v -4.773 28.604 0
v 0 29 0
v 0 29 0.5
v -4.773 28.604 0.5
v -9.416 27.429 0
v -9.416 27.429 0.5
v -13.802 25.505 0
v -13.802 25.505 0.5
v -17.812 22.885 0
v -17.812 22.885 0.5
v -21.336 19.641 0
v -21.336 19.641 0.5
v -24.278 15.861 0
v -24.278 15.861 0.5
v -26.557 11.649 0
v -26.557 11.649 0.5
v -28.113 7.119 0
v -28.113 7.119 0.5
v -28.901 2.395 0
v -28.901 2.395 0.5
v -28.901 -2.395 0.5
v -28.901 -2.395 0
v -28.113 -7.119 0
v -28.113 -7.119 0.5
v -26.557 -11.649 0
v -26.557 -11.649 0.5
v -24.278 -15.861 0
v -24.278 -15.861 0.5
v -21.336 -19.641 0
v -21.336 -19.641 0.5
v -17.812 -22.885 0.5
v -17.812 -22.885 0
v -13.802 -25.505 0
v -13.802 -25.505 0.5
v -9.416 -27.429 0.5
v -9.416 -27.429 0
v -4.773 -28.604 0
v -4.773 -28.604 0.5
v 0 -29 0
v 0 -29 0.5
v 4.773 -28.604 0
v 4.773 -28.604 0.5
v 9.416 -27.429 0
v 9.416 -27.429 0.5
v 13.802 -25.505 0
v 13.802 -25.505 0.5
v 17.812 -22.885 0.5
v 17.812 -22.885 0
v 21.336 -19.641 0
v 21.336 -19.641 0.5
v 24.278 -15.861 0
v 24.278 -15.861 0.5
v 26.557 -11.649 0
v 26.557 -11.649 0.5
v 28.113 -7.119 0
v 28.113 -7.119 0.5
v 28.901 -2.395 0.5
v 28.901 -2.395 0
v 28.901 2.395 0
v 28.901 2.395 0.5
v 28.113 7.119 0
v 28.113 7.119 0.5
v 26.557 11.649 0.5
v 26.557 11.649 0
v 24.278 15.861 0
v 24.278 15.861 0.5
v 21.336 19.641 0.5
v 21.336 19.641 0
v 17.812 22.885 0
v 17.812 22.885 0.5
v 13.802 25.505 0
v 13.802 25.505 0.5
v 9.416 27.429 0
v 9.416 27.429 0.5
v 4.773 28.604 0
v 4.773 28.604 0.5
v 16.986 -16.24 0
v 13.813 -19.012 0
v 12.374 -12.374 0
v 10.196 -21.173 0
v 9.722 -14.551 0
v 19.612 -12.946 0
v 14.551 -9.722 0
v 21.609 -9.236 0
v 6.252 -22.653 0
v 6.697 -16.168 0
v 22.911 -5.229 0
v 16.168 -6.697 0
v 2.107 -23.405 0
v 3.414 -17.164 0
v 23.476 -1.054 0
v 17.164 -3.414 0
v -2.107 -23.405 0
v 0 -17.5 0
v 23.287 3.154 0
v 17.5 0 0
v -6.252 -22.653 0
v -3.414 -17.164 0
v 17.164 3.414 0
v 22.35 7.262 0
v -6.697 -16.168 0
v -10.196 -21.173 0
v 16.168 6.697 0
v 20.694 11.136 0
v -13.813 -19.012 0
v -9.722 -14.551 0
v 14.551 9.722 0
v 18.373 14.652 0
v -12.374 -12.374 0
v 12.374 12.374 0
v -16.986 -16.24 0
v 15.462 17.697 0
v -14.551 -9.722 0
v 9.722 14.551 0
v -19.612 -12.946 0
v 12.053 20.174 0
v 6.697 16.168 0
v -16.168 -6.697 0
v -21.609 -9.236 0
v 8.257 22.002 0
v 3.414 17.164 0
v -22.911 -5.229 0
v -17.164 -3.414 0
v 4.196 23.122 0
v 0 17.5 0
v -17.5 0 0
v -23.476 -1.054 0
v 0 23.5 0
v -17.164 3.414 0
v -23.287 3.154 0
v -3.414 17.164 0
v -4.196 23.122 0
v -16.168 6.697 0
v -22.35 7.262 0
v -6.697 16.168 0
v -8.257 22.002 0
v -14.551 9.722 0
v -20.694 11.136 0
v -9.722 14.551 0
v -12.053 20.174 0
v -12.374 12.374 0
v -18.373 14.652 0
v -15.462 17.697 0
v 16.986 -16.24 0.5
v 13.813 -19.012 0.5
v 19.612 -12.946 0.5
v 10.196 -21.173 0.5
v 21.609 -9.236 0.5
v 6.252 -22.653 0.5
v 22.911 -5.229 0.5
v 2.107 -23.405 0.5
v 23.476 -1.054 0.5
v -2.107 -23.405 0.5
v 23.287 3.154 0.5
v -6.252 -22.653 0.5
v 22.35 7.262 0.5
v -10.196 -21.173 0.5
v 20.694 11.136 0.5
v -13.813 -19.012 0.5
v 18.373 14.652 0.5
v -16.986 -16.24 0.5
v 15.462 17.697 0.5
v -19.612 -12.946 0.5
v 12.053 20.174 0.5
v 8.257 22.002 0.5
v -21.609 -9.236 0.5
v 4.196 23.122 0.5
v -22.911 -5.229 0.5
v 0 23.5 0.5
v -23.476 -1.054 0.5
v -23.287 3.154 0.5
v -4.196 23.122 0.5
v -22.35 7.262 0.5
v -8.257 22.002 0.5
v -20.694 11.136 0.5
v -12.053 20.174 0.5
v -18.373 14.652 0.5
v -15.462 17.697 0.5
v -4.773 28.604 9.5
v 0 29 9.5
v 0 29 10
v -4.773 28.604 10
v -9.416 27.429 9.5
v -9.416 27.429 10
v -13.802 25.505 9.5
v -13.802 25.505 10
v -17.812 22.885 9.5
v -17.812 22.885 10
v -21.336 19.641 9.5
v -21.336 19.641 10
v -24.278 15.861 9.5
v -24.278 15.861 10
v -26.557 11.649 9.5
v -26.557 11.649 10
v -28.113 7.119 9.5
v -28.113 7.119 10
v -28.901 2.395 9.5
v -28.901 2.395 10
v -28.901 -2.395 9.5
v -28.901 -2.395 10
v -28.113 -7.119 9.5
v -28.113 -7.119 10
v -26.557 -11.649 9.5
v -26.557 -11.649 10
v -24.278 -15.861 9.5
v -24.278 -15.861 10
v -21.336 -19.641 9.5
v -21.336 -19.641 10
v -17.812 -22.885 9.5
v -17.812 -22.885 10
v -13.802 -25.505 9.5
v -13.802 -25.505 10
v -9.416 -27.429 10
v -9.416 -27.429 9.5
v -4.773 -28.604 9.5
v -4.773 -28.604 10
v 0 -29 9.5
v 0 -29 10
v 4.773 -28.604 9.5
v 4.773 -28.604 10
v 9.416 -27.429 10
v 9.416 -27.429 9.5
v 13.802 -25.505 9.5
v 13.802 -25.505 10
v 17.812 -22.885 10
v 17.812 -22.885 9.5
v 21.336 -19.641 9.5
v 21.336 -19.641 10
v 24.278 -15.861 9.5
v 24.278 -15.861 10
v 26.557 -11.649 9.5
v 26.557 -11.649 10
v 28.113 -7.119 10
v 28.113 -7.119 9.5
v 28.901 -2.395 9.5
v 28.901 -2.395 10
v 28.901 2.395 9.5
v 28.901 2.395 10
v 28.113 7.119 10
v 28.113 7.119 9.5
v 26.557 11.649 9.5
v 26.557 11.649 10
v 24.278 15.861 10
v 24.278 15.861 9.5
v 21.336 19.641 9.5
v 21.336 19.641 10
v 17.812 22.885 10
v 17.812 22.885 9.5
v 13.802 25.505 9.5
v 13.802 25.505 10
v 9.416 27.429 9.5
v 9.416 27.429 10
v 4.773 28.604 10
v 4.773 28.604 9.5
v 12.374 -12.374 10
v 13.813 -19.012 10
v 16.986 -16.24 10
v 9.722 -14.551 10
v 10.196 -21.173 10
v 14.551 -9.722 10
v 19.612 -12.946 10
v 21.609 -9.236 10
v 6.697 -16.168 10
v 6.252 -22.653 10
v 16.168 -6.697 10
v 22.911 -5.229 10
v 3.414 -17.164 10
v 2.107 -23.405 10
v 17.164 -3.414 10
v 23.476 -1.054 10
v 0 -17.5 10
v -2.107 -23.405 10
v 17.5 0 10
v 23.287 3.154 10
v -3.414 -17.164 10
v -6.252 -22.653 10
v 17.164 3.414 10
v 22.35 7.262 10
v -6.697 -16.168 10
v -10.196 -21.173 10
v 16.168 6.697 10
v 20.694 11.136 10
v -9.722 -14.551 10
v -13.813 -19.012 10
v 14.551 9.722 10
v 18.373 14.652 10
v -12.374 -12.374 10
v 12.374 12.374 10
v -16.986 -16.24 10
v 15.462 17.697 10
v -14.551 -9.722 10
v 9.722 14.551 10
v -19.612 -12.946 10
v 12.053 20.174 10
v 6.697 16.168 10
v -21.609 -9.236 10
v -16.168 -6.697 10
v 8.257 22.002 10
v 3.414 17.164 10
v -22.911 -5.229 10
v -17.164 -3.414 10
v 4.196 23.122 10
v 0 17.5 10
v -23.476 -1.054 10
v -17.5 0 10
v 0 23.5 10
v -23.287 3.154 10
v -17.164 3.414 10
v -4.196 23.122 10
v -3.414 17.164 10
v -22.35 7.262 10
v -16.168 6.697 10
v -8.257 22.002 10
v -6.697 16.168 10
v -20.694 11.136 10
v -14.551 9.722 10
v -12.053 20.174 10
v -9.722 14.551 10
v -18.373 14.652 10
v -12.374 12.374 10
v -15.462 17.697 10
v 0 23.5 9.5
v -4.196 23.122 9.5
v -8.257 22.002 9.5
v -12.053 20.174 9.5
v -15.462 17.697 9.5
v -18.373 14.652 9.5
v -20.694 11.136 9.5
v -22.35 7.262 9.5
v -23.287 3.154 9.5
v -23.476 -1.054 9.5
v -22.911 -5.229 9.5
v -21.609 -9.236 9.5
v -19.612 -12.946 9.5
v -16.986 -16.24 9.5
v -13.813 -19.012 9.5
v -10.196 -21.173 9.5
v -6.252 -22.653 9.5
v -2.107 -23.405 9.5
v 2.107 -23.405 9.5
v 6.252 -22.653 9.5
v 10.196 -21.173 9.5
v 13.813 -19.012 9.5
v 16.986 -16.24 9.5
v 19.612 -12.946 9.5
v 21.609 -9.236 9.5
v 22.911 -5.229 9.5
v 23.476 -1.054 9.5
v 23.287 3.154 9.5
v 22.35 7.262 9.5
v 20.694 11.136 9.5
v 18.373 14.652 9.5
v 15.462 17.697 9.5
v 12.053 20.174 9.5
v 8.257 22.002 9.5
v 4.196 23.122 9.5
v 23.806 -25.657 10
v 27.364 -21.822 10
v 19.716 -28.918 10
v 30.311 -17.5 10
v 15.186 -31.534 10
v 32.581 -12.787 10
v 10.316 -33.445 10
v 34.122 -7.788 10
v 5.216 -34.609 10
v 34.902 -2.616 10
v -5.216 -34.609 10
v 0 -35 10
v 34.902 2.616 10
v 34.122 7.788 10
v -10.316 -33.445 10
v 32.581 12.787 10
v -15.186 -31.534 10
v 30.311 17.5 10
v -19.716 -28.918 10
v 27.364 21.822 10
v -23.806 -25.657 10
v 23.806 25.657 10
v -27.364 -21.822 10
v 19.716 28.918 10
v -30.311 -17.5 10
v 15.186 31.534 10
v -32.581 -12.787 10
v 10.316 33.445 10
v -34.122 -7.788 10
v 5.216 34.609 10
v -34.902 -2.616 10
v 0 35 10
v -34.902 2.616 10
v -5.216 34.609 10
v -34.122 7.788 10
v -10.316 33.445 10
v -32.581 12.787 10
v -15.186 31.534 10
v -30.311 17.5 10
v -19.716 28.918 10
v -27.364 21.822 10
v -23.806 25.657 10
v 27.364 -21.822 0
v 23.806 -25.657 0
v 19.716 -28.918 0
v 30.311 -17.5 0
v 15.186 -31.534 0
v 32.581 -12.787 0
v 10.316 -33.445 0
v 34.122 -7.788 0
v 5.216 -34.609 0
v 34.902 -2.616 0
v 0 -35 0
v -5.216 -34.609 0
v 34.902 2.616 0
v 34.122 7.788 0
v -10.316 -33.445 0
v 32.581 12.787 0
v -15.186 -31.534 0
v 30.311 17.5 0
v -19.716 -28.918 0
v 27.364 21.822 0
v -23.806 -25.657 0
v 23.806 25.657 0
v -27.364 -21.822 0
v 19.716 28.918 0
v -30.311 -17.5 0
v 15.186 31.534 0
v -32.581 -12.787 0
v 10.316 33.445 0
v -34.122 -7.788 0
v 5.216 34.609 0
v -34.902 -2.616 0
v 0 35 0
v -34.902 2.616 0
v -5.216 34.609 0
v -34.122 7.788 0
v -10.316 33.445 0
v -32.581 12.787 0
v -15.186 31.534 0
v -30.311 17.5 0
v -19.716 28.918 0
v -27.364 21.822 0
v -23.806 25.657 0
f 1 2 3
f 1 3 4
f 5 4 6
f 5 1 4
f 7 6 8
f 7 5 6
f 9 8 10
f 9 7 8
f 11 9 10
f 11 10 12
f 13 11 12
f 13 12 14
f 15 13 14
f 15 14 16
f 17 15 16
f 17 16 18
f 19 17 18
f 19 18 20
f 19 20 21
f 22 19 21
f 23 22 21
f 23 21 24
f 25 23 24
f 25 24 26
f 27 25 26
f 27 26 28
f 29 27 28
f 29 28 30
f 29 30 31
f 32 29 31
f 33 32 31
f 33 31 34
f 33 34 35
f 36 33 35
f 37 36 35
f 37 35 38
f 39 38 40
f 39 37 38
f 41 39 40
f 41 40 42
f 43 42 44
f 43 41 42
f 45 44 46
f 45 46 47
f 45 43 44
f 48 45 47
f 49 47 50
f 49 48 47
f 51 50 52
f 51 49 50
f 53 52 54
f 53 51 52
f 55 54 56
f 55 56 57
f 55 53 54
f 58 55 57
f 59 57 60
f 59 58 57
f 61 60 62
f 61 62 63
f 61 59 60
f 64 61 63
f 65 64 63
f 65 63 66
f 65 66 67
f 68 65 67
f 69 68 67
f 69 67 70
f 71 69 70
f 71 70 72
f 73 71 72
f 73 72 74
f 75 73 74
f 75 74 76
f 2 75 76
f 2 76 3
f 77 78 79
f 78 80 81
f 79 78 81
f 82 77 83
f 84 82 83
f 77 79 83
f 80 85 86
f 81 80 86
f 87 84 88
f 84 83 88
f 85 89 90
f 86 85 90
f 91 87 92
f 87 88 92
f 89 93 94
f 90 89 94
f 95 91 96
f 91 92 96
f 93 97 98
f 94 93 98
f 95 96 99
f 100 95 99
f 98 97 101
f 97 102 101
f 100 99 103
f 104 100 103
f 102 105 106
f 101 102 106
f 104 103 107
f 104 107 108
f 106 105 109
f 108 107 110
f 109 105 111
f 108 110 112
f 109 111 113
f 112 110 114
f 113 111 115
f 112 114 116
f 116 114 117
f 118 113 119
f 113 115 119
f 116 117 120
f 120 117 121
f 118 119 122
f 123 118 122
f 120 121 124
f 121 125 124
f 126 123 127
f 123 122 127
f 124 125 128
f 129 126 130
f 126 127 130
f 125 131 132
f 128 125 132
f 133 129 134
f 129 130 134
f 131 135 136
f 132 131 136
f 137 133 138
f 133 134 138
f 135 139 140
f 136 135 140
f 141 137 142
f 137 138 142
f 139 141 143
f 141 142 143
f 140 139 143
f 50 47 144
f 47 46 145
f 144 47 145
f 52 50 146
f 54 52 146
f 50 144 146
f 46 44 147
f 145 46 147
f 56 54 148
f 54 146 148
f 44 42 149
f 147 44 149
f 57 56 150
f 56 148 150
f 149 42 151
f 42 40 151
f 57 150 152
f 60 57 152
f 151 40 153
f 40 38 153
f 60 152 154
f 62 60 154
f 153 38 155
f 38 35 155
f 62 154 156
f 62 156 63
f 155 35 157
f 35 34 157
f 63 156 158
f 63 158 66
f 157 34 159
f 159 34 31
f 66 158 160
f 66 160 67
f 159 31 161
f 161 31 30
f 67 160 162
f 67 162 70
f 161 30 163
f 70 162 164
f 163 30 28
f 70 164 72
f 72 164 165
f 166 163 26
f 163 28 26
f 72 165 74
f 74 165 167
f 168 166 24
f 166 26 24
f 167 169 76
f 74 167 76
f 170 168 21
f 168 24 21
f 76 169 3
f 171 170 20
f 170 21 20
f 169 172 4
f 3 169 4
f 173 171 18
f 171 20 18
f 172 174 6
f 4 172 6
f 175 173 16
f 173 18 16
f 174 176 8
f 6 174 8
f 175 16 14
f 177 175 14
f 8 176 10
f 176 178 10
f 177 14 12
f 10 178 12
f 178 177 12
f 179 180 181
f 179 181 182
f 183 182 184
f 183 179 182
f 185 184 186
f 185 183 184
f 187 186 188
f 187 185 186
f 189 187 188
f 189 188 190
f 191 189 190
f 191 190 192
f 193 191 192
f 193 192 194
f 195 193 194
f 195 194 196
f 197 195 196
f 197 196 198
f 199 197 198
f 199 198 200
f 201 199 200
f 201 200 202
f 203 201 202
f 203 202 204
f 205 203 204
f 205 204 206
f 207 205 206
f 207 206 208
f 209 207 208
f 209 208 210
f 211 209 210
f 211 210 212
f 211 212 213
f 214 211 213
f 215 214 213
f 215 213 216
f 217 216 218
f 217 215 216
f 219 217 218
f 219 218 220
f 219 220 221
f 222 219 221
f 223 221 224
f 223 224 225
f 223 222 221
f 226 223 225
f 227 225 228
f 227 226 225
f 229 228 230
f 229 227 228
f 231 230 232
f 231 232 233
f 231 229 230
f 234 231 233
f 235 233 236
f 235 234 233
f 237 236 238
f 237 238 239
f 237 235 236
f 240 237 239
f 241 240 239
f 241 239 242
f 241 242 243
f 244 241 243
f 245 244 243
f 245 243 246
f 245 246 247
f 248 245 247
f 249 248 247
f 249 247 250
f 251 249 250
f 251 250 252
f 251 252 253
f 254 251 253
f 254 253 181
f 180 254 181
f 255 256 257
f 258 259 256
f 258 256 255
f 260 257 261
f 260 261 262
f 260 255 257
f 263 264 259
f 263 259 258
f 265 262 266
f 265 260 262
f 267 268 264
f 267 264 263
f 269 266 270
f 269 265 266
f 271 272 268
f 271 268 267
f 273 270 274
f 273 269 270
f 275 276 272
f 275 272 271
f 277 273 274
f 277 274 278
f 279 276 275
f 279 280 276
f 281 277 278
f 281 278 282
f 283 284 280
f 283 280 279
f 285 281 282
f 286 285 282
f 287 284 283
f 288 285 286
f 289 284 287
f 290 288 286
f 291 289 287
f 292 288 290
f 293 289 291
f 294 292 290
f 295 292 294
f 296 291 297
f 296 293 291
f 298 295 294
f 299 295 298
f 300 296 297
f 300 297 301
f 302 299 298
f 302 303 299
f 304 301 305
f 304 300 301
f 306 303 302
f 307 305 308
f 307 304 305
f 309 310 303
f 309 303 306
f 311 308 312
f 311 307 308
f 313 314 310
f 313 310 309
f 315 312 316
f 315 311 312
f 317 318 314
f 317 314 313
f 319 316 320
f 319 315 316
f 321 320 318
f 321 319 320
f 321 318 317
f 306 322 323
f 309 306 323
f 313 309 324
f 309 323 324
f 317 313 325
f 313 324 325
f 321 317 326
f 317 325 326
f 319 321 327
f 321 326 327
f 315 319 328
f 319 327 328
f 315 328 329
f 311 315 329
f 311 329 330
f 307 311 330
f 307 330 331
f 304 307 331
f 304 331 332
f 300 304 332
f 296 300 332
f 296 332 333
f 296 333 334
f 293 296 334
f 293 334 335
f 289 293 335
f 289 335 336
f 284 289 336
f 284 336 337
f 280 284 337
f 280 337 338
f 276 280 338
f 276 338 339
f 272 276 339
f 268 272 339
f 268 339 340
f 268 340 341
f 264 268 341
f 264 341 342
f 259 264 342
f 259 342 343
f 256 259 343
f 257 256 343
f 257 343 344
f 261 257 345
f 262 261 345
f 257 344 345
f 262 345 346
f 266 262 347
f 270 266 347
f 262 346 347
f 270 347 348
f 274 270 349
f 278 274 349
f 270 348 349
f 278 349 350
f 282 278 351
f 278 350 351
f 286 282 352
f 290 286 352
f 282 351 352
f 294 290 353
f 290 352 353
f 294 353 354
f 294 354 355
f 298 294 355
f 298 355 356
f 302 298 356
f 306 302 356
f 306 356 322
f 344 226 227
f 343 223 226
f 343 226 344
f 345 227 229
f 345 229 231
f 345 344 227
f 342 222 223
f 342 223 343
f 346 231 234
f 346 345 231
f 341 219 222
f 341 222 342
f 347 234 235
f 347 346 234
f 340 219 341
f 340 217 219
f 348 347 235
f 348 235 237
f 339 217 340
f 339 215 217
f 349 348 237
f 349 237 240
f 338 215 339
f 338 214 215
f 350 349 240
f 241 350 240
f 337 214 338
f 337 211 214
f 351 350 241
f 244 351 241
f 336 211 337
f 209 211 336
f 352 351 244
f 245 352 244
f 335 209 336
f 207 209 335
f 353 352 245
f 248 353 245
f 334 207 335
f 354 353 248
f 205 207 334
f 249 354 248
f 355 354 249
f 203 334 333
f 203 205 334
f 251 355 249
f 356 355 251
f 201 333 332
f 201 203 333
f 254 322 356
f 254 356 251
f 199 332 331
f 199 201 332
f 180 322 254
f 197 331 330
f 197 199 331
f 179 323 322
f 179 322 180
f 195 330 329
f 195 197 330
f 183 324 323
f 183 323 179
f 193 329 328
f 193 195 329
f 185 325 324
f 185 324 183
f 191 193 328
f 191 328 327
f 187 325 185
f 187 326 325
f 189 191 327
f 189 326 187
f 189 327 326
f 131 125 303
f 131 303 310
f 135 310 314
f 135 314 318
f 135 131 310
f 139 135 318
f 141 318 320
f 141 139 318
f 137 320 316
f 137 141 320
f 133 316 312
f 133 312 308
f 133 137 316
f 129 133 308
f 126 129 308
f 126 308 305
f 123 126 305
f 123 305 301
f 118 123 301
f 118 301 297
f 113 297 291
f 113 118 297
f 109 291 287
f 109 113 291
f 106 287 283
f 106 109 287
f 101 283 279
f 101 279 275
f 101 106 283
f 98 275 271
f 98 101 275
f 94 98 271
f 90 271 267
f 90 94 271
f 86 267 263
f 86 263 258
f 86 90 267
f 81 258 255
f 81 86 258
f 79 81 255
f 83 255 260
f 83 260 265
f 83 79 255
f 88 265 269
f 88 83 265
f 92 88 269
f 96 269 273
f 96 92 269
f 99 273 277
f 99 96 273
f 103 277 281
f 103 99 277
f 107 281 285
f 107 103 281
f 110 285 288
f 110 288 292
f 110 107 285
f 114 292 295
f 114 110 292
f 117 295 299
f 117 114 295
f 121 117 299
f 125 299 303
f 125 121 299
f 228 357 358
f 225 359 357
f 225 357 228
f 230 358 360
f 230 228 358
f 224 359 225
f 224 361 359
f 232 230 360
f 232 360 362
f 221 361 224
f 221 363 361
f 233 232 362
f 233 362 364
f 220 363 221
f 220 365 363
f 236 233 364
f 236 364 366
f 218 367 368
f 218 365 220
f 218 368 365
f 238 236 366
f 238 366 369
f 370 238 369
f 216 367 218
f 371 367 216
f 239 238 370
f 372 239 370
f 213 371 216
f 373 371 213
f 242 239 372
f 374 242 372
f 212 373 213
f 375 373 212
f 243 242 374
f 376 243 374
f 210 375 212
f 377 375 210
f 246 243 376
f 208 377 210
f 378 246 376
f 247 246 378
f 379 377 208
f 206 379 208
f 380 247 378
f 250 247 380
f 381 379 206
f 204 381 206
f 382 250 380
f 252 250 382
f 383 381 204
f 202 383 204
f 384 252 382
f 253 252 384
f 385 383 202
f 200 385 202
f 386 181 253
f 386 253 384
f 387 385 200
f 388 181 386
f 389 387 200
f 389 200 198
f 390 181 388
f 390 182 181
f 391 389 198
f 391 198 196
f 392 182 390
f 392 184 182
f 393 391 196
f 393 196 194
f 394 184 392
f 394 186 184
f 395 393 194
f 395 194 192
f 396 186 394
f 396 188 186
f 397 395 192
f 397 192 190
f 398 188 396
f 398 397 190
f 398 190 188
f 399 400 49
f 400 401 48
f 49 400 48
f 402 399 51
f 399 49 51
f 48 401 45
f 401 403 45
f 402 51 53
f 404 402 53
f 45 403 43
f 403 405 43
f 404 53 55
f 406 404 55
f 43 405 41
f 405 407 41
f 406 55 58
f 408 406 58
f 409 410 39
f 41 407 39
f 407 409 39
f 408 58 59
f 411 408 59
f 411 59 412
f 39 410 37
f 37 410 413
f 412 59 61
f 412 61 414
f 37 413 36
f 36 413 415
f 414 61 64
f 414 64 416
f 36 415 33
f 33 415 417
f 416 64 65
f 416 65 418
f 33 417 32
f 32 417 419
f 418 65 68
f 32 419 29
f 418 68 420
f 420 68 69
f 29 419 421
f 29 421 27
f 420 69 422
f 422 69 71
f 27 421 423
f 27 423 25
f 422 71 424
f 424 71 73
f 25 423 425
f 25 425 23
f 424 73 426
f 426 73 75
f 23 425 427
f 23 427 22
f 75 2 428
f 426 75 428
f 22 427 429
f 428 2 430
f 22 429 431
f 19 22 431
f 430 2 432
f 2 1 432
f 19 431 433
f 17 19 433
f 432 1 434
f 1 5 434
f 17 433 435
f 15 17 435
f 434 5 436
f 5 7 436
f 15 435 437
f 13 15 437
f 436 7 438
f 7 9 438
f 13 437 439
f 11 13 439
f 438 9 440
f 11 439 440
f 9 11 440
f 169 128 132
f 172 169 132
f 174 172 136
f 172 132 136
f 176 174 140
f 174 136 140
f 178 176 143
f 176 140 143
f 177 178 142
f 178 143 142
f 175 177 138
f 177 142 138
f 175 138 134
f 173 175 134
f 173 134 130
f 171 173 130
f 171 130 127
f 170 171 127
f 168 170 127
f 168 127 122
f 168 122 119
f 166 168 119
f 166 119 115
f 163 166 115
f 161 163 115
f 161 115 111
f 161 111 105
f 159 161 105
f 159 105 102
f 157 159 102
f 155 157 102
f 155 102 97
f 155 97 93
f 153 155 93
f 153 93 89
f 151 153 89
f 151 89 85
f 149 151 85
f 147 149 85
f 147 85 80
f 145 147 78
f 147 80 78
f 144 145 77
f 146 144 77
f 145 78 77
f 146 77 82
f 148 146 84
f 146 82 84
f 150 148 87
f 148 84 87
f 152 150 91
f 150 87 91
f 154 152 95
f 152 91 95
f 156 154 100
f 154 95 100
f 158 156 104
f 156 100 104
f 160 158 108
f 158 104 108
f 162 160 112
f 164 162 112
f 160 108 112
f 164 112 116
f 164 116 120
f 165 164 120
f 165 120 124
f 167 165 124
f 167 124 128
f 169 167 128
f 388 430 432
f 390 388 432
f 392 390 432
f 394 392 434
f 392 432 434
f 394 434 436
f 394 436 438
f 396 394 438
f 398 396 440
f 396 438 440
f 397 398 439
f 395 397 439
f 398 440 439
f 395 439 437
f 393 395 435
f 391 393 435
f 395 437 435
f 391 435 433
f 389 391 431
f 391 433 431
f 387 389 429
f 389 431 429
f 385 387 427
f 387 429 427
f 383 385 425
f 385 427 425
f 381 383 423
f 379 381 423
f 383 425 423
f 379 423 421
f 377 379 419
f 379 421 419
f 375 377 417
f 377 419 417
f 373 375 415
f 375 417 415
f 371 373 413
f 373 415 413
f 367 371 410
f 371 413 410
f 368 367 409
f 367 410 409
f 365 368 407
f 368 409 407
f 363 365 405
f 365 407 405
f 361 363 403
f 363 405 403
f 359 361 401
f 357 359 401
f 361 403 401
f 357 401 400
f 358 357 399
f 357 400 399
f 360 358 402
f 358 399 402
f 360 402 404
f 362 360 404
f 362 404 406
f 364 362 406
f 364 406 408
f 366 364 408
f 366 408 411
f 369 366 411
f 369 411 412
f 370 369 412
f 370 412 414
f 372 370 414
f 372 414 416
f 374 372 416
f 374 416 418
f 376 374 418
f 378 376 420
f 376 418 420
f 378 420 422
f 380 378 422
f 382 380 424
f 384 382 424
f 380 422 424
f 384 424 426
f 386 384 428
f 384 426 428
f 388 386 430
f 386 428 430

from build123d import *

# Parameters (mm, degrees)
SKETCH1_R             = 35
SKETCH1_R_2           = 29
BOSS_EXTRUDE1_DEPTH   = 10
SKETCH1_R_3           = 23.5
SKETCH1_R_4           = 17.5
BOSS_EXTRUDE1_2_DEPTH = 10
BOSS_EXTRUDE2_START   = 0.5
SKETCH1_3_R           = 29
SKETCH1_3_R_2         = 23.5
BOSS_EXTRUDE2_DEPTH   = 9


with BuildPart() as part:
    # Sketch1 → Boss-Extrude1 (new body)
    with BuildSketch(Plane(origin=(0, 0, 0), x_dir=(0, 1, 0), z_dir=(0, 0, 1))):
        Circle(SKETCH1_R)
        Circle(SKETCH1_R_2, mode=Mode.SUBTRACT)
    extrude(amount=BOSS_EXTRUDE1_DEPTH)



with BuildPart() as body_2:
    # Sketch1 → Boss-Extrude1 2 (new body)
    with BuildSketch(Plane(origin=(0, 0, 0), x_dir=(0, 1, 0), z_dir=(0, 0, 1))):
        Circle(SKETCH1_R_3)
        Circle(SKETCH1_R_4, mode=Mode.SUBTRACT)
    extrude(amount=BOSS_EXTRUDE1_2_DEPTH)


with BuildPart() as part_1:
    add(part.part)

    add(body_2.part)  # Boss-Extrude2 merges body 2
    # Sketch1<3> → Boss-Extrude2 (add)
    with BuildSketch(Plane(origin=(0, 0, 0), x_dir=(0, 1, 0), z_dir=(0, 0, 1)).offset(BOSS_EXTRUDE2_START)):
        Circle(SKETCH1_3_R)
        Circle(SKETCH1_3_R_2, mode=Mode.SUBTRACT)
    extrude(amount=BOSS_EXTRUDE2_DEPTH)


solid = part_1.part
